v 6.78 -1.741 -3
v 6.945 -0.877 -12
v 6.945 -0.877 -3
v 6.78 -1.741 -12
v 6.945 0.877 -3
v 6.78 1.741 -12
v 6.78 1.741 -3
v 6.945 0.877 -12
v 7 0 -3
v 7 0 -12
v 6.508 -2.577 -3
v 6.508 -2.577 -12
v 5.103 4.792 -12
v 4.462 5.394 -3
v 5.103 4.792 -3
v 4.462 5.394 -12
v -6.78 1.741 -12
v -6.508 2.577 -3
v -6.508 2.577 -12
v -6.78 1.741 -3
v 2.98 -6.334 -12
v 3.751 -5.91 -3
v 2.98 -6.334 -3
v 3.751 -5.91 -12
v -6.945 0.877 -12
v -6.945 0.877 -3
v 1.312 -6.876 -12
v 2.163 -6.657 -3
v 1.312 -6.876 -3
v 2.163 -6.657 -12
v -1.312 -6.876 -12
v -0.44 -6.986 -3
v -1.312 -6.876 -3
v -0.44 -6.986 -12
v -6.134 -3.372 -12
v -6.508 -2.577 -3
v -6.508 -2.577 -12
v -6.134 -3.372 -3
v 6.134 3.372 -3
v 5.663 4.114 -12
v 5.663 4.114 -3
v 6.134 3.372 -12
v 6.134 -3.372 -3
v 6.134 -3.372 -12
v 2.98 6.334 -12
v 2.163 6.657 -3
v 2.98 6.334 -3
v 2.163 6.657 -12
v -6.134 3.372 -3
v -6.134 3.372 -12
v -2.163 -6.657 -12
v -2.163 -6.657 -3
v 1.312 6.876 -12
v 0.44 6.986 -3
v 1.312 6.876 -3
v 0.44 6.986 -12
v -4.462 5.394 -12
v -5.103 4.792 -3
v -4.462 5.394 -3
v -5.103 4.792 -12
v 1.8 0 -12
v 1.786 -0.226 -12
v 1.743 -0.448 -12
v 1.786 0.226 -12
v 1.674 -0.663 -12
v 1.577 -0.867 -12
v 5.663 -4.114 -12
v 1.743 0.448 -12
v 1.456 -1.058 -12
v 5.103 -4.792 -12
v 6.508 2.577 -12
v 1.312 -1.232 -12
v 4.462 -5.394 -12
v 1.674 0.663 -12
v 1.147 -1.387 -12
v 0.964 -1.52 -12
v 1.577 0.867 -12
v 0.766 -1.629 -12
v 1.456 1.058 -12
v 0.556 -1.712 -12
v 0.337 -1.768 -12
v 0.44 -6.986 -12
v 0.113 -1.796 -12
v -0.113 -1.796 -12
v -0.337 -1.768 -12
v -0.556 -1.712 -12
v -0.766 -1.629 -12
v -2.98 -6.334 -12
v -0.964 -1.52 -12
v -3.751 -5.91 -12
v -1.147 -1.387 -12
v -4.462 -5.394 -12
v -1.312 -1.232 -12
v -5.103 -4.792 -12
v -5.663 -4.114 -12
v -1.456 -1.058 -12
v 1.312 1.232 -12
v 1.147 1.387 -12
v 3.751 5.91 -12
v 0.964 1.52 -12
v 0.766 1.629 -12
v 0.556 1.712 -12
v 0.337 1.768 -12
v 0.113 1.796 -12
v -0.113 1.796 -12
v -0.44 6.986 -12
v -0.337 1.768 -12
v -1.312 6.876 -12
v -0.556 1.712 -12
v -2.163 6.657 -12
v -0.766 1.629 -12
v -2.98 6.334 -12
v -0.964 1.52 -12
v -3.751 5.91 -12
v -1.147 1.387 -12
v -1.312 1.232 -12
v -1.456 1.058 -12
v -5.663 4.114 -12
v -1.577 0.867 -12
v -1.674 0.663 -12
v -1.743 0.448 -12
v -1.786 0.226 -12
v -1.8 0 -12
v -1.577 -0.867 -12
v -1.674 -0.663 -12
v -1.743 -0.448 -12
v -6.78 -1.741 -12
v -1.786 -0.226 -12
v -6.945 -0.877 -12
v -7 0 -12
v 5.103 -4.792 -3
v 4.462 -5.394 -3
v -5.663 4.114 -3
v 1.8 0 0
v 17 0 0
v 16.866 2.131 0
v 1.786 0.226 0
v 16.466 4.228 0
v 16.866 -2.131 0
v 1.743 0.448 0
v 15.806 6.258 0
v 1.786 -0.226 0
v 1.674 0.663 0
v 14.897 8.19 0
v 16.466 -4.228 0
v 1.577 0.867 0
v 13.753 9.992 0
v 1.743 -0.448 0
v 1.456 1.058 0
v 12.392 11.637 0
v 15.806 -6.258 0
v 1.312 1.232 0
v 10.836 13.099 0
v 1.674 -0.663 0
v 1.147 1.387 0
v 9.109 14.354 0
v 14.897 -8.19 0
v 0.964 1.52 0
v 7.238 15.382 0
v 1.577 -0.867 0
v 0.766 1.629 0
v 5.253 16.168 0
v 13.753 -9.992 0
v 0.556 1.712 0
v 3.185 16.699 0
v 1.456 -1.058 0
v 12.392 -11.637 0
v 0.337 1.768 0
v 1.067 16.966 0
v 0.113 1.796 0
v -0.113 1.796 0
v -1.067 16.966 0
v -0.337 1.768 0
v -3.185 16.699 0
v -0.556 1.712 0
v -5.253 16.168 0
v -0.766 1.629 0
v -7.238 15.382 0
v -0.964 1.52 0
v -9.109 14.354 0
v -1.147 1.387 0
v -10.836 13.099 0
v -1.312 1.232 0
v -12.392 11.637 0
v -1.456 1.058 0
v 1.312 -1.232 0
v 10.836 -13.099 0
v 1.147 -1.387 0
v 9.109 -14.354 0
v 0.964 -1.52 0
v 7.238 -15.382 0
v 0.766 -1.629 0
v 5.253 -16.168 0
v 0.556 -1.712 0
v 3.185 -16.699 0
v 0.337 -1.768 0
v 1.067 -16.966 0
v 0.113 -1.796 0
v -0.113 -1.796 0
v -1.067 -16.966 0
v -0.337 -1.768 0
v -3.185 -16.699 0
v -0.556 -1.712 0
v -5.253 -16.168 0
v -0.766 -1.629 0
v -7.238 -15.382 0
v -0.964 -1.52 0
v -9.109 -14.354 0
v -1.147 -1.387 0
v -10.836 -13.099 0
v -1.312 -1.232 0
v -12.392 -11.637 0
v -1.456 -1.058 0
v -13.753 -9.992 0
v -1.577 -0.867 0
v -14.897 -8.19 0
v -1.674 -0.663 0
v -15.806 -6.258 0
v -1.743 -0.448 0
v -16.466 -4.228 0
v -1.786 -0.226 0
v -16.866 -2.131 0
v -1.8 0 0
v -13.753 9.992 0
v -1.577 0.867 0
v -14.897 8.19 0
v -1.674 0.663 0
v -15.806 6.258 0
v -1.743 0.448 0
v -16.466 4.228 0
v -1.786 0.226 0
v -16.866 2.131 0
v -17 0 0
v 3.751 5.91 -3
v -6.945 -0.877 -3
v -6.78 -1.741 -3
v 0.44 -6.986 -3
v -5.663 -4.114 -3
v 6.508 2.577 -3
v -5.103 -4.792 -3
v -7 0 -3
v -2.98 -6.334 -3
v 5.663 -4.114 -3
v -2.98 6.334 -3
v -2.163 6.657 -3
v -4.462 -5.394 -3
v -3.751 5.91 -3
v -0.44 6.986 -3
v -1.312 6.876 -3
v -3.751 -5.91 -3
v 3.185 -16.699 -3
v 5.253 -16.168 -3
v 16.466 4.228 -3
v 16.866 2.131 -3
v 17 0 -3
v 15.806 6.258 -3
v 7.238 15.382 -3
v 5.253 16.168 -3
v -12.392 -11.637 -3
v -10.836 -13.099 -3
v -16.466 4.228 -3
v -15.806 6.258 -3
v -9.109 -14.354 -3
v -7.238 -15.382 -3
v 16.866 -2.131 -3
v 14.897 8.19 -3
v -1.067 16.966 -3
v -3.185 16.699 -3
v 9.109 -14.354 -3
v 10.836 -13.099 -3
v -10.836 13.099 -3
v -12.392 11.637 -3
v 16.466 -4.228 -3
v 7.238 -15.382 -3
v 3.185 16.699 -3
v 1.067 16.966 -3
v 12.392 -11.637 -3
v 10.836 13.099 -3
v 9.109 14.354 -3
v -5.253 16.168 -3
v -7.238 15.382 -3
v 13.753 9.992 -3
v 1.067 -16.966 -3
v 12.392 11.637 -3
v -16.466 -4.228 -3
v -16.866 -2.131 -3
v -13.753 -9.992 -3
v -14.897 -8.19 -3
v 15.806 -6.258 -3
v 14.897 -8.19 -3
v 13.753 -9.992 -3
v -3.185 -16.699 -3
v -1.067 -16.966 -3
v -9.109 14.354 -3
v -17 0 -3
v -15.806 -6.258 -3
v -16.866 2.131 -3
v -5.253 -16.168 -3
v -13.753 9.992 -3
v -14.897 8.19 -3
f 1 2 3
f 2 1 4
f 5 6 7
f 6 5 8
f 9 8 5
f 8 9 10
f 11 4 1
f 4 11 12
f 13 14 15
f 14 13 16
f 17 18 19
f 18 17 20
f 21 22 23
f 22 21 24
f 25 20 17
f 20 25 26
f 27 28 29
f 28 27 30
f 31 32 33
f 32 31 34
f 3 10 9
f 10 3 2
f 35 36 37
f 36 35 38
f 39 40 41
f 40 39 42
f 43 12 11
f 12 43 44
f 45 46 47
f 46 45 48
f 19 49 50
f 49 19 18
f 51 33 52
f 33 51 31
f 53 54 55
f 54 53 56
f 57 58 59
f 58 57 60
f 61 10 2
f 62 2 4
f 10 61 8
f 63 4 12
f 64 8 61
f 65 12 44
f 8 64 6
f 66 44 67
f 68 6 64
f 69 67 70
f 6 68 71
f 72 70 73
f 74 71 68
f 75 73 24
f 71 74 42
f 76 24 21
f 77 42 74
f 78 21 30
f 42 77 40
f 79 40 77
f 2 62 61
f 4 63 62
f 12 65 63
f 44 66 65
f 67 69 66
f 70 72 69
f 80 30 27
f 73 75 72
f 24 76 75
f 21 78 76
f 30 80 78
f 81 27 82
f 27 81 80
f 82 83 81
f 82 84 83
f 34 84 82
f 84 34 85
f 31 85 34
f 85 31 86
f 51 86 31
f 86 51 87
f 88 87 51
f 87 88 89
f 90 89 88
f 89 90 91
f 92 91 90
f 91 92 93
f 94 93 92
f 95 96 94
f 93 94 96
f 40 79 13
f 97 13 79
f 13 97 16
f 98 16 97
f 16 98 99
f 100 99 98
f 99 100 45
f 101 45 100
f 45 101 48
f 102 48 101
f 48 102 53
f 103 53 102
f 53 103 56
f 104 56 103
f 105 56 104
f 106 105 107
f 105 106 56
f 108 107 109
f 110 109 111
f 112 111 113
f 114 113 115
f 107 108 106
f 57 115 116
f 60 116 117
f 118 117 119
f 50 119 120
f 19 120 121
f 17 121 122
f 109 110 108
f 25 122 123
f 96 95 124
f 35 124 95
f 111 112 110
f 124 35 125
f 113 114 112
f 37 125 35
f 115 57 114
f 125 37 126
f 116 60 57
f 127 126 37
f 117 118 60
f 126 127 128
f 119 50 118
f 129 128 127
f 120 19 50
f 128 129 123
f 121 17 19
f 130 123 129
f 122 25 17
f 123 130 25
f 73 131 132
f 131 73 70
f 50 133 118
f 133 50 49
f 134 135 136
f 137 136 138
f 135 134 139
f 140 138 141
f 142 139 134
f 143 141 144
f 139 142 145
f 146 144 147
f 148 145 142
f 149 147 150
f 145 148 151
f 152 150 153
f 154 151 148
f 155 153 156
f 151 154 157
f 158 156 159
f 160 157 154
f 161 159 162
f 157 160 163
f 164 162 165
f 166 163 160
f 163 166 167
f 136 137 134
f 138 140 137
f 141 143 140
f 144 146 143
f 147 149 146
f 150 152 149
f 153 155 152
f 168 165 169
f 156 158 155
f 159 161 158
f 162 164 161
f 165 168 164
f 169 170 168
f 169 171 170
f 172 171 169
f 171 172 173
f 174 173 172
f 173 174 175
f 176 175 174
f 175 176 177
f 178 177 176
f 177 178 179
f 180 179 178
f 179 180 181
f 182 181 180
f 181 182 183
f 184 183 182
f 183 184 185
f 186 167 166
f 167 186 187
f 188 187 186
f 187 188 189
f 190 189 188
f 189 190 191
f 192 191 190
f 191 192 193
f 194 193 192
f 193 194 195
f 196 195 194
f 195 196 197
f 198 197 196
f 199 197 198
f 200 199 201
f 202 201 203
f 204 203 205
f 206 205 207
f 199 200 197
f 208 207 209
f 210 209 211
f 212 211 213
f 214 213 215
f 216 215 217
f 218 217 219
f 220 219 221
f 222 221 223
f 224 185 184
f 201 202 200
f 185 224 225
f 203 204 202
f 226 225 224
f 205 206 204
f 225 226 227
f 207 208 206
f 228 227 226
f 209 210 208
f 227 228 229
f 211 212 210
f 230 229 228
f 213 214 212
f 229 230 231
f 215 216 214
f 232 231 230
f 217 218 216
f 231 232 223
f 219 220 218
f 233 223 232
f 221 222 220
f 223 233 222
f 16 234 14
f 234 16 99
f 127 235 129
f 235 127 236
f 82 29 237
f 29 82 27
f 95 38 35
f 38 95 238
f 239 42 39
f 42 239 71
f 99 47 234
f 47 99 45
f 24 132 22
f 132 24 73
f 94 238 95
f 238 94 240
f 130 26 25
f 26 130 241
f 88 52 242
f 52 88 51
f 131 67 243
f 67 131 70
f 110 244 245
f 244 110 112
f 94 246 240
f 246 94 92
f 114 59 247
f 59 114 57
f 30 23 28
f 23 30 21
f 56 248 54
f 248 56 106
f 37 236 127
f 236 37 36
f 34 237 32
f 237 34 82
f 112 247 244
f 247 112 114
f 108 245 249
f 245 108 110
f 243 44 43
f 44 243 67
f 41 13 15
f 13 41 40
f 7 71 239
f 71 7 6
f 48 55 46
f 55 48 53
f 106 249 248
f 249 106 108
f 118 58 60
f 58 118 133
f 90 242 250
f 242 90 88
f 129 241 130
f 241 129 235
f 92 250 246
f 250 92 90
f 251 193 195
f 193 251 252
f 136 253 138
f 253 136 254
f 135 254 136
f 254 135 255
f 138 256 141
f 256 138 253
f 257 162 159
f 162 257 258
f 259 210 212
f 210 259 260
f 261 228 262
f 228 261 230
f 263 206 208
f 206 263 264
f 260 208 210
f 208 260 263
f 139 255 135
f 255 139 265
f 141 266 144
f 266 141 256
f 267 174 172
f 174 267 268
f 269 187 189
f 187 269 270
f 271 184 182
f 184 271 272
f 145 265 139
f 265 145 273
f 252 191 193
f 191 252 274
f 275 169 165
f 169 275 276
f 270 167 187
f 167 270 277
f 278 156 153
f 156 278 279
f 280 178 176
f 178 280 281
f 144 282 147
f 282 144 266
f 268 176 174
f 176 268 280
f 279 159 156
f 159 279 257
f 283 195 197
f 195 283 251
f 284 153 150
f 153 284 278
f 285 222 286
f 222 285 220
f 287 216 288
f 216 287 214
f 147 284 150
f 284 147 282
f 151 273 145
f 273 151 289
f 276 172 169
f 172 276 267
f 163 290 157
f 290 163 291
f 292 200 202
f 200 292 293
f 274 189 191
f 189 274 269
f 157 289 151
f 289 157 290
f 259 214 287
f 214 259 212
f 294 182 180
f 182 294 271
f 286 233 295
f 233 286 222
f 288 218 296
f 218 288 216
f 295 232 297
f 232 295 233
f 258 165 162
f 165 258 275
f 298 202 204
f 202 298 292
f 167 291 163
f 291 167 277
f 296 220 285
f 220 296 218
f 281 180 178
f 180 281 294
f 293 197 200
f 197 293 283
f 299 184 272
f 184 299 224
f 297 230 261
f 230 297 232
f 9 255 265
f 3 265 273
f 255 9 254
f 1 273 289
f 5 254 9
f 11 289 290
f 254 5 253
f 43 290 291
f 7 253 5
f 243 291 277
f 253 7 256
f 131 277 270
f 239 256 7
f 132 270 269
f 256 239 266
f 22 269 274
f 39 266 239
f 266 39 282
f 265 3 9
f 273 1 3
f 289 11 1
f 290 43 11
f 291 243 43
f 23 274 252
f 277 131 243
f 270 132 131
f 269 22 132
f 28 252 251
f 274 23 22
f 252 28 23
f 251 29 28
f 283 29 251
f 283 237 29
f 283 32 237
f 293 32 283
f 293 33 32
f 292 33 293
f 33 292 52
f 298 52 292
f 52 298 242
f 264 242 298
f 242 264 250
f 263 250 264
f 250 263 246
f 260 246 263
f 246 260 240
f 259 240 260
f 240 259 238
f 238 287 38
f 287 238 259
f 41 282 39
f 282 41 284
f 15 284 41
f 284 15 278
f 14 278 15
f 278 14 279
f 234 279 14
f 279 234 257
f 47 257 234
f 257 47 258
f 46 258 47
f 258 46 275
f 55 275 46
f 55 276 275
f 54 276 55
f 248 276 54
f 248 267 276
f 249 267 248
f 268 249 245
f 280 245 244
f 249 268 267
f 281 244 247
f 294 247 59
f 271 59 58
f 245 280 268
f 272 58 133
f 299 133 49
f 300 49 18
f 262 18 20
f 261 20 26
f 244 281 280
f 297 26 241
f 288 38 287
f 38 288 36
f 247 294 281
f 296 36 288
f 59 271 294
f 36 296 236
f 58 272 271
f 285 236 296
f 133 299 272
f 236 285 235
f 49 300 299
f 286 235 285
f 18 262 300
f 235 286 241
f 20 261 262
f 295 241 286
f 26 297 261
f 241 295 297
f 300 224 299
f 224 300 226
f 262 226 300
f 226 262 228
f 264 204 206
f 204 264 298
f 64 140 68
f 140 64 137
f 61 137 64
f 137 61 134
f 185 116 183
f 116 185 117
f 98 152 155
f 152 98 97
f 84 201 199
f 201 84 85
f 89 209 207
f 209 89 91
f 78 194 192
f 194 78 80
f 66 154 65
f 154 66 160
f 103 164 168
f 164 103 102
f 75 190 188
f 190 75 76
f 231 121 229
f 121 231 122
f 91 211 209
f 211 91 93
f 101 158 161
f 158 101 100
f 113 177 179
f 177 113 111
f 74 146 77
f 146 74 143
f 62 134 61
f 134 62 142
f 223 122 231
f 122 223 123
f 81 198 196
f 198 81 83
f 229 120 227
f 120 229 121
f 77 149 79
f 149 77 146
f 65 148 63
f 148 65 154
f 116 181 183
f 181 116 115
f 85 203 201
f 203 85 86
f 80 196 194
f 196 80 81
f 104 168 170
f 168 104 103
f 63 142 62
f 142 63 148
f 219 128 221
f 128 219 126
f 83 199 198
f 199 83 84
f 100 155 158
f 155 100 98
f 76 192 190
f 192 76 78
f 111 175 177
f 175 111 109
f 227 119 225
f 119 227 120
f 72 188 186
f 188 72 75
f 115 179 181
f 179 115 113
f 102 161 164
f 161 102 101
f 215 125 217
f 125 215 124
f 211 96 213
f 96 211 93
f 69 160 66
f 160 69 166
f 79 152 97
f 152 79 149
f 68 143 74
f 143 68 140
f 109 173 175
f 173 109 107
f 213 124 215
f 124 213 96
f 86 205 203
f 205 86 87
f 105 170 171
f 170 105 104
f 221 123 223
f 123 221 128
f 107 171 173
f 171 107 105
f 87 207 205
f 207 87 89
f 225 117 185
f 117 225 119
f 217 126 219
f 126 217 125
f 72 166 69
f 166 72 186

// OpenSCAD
$fn = 50;


difference() {
	union() {
		translate(v = [0, 0, -12.0000000000]) {
			cylinder(h = 12, r = 7.0000000000);
		}
		translate(v = [0, 0, -3.0000000000]) {
			cylinder(h = 3, r = 17.0000000000);
		}
	}
	union() {
		#translate(v = [0, 0, -12]) {
			cylinder(h = 12, r = 1.8000000000);
		}
	}
}
